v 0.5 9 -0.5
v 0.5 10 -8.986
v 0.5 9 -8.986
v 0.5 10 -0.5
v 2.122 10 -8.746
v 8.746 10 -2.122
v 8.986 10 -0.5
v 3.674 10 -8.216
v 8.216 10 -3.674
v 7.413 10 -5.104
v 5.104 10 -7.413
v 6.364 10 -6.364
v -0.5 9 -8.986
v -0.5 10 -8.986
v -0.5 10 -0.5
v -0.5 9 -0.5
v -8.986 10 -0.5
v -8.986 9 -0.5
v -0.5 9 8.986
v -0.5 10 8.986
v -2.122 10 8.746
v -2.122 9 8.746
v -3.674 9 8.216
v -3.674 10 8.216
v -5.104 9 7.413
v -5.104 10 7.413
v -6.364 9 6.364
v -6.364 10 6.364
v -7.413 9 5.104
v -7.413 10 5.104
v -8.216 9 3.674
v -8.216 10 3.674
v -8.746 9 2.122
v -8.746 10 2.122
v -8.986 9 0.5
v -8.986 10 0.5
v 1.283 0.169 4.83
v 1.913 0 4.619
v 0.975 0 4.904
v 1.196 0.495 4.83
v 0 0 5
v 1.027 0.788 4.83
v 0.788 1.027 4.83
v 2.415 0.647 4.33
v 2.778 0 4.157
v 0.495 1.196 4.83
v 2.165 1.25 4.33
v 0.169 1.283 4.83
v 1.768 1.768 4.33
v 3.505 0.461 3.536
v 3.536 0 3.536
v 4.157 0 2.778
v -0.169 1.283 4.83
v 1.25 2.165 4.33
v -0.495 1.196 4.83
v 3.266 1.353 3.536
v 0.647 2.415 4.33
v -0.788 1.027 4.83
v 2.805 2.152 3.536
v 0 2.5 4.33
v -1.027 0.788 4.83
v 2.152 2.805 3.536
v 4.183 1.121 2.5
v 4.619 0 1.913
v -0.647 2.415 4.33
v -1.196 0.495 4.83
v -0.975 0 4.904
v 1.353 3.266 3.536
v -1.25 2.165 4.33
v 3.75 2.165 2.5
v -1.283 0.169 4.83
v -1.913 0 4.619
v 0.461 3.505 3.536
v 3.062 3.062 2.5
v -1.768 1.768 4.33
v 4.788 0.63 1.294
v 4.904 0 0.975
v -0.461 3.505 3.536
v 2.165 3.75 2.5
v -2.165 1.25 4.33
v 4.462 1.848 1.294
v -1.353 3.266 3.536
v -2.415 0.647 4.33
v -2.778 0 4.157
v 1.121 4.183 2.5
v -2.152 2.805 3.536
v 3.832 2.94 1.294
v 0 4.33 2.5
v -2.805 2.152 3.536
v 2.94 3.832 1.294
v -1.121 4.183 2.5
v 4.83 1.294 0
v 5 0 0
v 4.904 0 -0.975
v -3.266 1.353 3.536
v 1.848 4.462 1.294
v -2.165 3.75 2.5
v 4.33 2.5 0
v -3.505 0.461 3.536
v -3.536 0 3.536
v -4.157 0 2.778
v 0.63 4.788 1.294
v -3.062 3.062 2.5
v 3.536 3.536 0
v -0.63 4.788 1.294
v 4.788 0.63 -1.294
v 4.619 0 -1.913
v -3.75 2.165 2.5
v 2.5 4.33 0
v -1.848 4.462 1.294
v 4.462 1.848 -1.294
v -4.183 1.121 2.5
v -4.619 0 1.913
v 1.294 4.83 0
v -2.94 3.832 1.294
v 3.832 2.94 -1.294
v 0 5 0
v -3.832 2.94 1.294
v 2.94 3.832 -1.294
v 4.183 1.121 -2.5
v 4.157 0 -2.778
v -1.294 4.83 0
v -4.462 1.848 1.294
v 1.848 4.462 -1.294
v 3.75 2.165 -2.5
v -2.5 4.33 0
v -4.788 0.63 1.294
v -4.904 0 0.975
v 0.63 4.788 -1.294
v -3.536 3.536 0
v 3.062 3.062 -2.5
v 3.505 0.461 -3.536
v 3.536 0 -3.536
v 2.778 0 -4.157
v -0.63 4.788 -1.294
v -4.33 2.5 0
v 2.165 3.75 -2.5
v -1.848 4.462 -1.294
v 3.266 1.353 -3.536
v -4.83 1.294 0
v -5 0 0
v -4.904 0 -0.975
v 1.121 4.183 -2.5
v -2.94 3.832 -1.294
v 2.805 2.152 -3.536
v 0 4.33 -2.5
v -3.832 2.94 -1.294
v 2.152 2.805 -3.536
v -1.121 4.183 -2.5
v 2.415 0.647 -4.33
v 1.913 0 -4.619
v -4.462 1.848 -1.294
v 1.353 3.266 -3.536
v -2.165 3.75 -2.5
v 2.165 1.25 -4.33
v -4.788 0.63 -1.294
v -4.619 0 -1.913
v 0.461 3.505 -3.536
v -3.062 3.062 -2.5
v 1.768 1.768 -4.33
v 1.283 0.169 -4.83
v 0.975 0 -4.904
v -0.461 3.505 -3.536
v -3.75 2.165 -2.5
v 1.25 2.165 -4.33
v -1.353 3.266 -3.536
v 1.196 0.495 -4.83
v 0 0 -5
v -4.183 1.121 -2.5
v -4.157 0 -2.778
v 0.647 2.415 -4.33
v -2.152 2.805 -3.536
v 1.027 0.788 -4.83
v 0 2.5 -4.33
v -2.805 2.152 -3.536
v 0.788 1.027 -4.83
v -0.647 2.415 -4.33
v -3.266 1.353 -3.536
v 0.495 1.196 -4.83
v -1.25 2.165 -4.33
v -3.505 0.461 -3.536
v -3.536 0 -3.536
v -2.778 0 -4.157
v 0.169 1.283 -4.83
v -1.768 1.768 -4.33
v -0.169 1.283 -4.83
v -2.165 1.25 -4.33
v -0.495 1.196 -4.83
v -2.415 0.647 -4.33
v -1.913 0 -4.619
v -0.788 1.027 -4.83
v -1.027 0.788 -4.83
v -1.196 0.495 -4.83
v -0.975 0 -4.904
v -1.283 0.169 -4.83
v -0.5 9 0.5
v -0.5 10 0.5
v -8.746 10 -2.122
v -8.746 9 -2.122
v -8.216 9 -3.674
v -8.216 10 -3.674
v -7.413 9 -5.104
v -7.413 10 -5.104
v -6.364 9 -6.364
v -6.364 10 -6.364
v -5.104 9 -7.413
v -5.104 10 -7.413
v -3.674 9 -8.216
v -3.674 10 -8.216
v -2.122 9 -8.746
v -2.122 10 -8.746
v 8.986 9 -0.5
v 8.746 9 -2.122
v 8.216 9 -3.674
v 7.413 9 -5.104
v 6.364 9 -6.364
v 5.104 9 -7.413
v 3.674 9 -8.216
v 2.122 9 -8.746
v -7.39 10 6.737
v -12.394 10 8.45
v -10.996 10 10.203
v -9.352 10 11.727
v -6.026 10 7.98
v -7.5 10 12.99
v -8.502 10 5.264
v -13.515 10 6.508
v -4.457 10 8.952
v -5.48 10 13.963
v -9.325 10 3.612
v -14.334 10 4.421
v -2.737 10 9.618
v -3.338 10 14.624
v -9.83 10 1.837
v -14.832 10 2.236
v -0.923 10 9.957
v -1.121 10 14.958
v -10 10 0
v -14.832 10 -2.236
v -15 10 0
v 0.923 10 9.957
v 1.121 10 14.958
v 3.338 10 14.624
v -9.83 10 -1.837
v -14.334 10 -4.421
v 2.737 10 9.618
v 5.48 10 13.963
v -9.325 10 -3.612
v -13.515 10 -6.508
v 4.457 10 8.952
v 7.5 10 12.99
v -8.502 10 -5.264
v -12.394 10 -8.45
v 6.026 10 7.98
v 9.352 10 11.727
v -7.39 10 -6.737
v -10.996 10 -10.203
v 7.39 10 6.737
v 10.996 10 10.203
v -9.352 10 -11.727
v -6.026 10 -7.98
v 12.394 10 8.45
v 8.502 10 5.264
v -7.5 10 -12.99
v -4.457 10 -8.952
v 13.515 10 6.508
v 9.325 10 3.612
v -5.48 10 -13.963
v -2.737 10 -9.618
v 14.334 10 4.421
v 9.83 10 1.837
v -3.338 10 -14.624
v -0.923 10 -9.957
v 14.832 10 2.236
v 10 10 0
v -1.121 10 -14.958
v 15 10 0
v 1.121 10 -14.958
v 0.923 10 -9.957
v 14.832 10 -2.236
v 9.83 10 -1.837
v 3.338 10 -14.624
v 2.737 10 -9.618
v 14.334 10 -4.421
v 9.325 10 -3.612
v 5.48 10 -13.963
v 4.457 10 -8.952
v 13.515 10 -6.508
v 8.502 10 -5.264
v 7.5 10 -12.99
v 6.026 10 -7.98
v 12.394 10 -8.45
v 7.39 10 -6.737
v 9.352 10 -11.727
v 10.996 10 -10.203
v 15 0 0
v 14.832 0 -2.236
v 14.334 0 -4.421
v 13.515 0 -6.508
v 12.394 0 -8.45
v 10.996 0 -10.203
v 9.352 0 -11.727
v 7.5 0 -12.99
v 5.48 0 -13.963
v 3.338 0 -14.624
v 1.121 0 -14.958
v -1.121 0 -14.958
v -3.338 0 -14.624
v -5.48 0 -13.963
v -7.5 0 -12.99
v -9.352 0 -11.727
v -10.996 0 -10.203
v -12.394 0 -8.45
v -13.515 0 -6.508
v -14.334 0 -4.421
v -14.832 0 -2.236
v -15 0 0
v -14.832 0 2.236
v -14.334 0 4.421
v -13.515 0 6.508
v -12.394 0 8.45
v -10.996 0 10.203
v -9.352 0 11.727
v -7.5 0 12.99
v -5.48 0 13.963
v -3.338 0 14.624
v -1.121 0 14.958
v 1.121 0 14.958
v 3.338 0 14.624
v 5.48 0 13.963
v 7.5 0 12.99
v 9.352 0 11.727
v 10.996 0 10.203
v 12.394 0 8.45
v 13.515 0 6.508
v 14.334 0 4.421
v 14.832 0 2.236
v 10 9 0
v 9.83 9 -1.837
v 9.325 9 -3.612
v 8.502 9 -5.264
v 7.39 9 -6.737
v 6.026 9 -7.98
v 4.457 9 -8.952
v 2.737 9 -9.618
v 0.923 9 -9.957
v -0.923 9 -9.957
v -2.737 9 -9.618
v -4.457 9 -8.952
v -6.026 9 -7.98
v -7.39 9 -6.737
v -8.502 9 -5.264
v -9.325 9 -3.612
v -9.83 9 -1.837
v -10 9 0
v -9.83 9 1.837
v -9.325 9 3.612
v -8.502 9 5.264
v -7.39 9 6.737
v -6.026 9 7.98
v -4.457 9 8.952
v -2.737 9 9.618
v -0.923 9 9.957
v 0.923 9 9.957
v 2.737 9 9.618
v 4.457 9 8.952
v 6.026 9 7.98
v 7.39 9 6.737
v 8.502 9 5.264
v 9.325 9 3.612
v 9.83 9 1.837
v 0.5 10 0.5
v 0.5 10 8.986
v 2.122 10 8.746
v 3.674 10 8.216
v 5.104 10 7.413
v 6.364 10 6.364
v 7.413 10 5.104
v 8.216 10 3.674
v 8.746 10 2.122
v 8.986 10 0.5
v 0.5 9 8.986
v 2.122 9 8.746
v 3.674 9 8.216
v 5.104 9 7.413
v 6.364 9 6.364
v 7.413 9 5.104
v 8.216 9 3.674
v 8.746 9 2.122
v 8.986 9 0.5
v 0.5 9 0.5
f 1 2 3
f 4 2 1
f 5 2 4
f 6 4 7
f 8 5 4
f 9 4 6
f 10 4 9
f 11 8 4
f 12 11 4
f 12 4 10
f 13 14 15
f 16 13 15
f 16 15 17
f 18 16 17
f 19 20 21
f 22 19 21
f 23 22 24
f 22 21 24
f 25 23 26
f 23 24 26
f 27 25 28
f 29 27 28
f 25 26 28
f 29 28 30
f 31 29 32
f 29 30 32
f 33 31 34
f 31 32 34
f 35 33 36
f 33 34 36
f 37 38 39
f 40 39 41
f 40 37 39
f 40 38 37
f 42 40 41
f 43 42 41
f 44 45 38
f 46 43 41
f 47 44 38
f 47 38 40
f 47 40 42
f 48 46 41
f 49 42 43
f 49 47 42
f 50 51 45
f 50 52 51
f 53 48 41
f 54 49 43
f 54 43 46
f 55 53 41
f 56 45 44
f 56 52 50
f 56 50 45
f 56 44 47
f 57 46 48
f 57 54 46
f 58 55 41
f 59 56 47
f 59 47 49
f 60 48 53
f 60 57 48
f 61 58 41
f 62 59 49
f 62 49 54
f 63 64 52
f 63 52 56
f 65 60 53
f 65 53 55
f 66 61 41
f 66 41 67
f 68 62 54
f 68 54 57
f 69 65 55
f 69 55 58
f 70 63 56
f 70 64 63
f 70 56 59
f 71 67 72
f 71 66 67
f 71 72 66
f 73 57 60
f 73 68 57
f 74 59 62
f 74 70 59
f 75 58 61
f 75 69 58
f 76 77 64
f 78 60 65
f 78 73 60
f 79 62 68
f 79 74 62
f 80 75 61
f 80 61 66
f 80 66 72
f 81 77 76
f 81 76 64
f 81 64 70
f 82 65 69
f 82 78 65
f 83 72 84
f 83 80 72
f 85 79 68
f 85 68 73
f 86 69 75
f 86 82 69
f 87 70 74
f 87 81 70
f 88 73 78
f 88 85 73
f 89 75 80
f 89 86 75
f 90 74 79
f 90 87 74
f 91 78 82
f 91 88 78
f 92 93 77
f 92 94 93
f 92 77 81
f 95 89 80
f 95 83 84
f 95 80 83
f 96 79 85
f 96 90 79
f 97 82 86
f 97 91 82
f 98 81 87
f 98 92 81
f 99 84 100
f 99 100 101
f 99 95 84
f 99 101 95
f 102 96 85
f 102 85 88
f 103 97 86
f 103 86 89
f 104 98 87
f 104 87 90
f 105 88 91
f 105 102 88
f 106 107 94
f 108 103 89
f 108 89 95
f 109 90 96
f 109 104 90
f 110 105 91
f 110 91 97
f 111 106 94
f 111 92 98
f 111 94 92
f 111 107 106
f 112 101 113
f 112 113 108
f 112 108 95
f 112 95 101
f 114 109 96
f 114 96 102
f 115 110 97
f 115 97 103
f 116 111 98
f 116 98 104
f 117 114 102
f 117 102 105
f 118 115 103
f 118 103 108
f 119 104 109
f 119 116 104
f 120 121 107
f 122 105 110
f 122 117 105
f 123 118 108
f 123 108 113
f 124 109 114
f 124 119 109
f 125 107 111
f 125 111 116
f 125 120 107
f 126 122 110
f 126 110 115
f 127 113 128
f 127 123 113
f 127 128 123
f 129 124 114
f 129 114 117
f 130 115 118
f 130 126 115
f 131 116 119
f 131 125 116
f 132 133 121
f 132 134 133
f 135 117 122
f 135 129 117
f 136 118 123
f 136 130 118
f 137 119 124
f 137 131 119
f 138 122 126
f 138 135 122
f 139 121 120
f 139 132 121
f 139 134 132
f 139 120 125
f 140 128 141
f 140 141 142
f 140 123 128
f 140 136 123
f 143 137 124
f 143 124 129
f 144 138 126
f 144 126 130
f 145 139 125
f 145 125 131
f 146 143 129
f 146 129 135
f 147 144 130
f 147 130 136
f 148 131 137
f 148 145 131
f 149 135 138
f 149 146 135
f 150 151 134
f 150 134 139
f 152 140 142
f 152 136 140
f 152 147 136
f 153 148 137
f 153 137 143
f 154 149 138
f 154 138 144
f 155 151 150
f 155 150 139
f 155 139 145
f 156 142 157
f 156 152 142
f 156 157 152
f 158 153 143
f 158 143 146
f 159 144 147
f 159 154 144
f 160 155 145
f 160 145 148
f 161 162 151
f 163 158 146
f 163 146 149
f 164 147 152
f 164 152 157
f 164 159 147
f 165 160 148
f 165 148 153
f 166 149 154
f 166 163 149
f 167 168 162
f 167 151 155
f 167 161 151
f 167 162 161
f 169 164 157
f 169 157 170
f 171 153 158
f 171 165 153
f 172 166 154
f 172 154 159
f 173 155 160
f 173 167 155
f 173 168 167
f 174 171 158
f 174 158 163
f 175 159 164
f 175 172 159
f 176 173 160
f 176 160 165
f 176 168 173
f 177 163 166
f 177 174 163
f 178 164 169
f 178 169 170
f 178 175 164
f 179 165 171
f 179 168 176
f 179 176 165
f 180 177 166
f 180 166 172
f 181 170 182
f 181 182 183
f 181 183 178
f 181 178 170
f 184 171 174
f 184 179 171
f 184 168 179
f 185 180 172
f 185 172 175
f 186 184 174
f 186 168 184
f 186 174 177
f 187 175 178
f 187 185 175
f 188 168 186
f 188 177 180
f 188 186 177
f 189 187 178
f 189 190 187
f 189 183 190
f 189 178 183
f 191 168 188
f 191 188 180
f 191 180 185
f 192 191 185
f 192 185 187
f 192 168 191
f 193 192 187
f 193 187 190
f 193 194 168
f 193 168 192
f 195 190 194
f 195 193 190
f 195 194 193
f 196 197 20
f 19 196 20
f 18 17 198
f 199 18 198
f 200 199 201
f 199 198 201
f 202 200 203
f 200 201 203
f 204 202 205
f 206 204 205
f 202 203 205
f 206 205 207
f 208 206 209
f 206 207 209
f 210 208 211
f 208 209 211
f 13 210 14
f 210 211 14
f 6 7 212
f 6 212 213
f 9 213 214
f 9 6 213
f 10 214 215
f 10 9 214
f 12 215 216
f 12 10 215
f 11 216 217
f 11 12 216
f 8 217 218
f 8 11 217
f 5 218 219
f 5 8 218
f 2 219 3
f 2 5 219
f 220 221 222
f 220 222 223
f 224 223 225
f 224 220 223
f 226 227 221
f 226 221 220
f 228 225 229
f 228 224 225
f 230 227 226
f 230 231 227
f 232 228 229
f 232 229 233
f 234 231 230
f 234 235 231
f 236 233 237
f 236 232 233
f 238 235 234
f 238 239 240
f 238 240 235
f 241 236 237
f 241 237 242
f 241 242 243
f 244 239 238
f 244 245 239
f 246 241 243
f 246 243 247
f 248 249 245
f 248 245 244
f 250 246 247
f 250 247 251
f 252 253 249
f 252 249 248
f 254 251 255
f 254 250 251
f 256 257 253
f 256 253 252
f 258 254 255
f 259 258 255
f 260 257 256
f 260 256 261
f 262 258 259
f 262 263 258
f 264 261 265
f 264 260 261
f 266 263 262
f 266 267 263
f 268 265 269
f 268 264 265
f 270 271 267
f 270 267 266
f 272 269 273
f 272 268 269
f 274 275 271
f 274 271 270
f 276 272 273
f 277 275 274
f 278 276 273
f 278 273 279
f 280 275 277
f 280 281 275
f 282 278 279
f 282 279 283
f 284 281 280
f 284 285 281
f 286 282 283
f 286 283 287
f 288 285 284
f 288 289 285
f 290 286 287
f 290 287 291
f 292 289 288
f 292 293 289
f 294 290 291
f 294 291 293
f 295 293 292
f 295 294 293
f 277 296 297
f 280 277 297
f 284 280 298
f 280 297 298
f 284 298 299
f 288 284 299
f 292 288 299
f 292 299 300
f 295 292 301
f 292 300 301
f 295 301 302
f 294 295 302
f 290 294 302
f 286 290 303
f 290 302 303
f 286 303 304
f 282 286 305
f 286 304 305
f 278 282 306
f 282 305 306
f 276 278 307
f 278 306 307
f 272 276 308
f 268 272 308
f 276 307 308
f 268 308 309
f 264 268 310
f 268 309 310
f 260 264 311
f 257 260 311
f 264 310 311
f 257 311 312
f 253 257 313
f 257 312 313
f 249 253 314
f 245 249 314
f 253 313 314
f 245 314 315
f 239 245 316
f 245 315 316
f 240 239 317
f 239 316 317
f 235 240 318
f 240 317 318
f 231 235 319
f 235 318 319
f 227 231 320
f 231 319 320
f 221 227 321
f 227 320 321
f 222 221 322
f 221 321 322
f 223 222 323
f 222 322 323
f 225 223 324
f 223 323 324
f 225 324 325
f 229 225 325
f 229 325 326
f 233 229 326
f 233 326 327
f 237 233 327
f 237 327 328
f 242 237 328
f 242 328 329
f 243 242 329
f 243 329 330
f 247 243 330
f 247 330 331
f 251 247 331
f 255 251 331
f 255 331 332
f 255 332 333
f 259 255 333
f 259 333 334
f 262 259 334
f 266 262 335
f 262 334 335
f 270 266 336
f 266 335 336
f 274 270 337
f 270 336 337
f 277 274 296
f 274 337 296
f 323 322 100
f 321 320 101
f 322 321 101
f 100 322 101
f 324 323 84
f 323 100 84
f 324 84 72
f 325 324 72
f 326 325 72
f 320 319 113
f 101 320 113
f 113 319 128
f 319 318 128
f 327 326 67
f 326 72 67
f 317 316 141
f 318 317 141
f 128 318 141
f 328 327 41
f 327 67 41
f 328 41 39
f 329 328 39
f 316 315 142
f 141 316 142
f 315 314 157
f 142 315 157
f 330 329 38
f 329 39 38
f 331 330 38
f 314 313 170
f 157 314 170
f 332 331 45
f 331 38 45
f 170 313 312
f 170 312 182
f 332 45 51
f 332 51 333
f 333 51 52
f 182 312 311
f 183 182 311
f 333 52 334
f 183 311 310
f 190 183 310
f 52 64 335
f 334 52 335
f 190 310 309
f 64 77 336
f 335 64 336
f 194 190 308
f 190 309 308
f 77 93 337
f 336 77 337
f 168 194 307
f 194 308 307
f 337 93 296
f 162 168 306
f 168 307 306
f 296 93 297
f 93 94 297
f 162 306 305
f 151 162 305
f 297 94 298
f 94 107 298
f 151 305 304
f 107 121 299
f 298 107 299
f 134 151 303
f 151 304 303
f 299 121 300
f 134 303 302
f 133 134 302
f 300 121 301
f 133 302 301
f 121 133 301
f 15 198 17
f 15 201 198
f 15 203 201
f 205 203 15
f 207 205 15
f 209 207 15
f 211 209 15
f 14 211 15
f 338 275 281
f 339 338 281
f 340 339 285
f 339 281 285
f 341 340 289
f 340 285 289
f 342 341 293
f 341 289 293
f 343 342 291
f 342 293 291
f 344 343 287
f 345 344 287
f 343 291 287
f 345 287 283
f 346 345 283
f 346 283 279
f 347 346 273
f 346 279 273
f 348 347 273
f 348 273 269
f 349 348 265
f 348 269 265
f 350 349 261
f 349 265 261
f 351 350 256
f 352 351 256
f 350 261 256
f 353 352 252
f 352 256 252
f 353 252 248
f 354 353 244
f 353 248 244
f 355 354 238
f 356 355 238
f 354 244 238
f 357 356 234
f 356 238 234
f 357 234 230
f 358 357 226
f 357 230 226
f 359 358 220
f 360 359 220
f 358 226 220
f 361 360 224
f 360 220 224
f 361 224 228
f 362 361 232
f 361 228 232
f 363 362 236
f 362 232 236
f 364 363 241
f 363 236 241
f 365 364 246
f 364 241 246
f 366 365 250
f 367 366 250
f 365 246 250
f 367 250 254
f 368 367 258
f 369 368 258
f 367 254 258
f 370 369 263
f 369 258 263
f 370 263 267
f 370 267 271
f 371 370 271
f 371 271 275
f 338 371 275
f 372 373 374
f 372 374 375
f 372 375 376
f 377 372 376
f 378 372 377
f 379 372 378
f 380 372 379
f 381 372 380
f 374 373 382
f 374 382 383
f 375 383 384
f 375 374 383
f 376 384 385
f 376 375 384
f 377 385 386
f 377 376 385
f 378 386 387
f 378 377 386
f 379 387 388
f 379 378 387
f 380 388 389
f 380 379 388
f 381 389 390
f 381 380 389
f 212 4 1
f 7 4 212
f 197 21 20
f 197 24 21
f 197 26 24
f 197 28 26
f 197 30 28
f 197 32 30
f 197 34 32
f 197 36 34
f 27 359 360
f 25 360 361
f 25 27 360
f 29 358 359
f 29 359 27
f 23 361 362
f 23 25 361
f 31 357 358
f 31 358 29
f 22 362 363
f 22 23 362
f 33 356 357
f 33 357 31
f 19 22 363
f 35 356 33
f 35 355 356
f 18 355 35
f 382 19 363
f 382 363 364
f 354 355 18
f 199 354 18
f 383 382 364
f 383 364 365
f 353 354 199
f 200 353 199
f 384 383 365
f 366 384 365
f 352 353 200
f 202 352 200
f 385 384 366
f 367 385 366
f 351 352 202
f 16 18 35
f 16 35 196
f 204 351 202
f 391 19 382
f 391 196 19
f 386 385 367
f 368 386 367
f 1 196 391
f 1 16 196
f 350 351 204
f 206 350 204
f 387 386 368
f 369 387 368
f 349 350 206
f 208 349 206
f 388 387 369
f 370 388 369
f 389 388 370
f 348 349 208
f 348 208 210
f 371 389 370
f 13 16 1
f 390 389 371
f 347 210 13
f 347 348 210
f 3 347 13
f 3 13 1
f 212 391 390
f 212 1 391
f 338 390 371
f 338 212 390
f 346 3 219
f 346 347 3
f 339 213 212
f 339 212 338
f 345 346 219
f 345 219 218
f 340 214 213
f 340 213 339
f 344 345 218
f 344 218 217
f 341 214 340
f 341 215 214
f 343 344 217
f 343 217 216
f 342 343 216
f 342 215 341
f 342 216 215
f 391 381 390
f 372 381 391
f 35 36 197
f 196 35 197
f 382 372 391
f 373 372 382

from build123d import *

# Parameters (mm, degrees)
SKETCH1_R           = 15
BOSS_EXTRUDE1_DEPTH = 10
SKETCH2_R           = 10
CUT_EXTRUDE1_DEPTH  = 1


with BuildPart() as part:
    # Sketch1 → Boss-Extrude1 (new body)
    with BuildSketch(Plane(origin=(0, 0, 0), x_dir=(1, 0, 0), z_dir=(0, 1, 0))):
        Circle(SKETCH1_R)
    extrude(amount=BOSS_EXTRUDE1_DEPTH)

    # Sketch3 → Cut-Revolve1 (revolve, cut)
    with BuildSketch(Plane(origin=(0, 0, 0), x_dir=(-1, 0, 0), z_dir=(0, -1, 0))):
        with BuildLine():
            Line((0, 5), (0, -5))
            ThreePointArc((0, -5), (5, 0), (0, 5))
        make_face()
    revolve(axis=Axis((0, 0, -5), (0, 0, 1)), mode=Mode.SUBTRACT)

    # Sketch2 → Cut-Extrude1 (cut)
    with BuildSketch(Plane(origin=(0, 10, 0), x_dir=(1, 0, 0), z_dir=(0, 1, 0))):
        Circle(SKETCH2_R)
        with BuildLine():
            Line((-0.5, -0.499807062), (-0.5, -8.986100378))
            ThreePointArc((-0.5, -8.986100378), (-6.36402935, -6.363892711), (-8.986111111, -0.499807062))
            Line((-8.986111111, -0.499807062), (-0.5, -0.499807062))
        make_face(mode=Mode.SUBTRACT)
        with BuildLine():
            Line((0.499807062, 8.986111111), (0.499807062, 0.499807062))
            Line((0.499807062, 0.499807062), (8.986111111, 0.499807062))
            ThreePointArc((8.986111111, 0.499807062), (6.363961031, 6.363961031), (0.499807062, 8.986111111))
        make_face(mode=Mode.SUBTRACT)
        with BuildLine():
            Line((-0.5, 8.986100378), (-0.5, 0.499807062))
            Line((-0.5, 0.499807062), (-8.986111111, 0.499807062))
            ThreePointArc((-8.986111111, 0.499807062), (-6.36402935, 6.363892711), (-0.5, 8.986100378))
        make_face(mode=Mode.SUBTRACT)
        with BuildLine():
            Line((8.986111111, -0.499807062), (0.499807062, -0.499807062))
            Line((0.499807062, -0.499807062), (0.499807062, -8.986111111))
            ThreePointArc((0.499807062, -8.986111111), (6.363961031, -6.363961031), (8.986111111, -0.499807062))
        make_face(mode=Mode.SUBTRACT)
    extrude(amount=-CUT_EXTRUDE1_DEPTH, mode=Mode.SUBTRACT)


solid = part.part
